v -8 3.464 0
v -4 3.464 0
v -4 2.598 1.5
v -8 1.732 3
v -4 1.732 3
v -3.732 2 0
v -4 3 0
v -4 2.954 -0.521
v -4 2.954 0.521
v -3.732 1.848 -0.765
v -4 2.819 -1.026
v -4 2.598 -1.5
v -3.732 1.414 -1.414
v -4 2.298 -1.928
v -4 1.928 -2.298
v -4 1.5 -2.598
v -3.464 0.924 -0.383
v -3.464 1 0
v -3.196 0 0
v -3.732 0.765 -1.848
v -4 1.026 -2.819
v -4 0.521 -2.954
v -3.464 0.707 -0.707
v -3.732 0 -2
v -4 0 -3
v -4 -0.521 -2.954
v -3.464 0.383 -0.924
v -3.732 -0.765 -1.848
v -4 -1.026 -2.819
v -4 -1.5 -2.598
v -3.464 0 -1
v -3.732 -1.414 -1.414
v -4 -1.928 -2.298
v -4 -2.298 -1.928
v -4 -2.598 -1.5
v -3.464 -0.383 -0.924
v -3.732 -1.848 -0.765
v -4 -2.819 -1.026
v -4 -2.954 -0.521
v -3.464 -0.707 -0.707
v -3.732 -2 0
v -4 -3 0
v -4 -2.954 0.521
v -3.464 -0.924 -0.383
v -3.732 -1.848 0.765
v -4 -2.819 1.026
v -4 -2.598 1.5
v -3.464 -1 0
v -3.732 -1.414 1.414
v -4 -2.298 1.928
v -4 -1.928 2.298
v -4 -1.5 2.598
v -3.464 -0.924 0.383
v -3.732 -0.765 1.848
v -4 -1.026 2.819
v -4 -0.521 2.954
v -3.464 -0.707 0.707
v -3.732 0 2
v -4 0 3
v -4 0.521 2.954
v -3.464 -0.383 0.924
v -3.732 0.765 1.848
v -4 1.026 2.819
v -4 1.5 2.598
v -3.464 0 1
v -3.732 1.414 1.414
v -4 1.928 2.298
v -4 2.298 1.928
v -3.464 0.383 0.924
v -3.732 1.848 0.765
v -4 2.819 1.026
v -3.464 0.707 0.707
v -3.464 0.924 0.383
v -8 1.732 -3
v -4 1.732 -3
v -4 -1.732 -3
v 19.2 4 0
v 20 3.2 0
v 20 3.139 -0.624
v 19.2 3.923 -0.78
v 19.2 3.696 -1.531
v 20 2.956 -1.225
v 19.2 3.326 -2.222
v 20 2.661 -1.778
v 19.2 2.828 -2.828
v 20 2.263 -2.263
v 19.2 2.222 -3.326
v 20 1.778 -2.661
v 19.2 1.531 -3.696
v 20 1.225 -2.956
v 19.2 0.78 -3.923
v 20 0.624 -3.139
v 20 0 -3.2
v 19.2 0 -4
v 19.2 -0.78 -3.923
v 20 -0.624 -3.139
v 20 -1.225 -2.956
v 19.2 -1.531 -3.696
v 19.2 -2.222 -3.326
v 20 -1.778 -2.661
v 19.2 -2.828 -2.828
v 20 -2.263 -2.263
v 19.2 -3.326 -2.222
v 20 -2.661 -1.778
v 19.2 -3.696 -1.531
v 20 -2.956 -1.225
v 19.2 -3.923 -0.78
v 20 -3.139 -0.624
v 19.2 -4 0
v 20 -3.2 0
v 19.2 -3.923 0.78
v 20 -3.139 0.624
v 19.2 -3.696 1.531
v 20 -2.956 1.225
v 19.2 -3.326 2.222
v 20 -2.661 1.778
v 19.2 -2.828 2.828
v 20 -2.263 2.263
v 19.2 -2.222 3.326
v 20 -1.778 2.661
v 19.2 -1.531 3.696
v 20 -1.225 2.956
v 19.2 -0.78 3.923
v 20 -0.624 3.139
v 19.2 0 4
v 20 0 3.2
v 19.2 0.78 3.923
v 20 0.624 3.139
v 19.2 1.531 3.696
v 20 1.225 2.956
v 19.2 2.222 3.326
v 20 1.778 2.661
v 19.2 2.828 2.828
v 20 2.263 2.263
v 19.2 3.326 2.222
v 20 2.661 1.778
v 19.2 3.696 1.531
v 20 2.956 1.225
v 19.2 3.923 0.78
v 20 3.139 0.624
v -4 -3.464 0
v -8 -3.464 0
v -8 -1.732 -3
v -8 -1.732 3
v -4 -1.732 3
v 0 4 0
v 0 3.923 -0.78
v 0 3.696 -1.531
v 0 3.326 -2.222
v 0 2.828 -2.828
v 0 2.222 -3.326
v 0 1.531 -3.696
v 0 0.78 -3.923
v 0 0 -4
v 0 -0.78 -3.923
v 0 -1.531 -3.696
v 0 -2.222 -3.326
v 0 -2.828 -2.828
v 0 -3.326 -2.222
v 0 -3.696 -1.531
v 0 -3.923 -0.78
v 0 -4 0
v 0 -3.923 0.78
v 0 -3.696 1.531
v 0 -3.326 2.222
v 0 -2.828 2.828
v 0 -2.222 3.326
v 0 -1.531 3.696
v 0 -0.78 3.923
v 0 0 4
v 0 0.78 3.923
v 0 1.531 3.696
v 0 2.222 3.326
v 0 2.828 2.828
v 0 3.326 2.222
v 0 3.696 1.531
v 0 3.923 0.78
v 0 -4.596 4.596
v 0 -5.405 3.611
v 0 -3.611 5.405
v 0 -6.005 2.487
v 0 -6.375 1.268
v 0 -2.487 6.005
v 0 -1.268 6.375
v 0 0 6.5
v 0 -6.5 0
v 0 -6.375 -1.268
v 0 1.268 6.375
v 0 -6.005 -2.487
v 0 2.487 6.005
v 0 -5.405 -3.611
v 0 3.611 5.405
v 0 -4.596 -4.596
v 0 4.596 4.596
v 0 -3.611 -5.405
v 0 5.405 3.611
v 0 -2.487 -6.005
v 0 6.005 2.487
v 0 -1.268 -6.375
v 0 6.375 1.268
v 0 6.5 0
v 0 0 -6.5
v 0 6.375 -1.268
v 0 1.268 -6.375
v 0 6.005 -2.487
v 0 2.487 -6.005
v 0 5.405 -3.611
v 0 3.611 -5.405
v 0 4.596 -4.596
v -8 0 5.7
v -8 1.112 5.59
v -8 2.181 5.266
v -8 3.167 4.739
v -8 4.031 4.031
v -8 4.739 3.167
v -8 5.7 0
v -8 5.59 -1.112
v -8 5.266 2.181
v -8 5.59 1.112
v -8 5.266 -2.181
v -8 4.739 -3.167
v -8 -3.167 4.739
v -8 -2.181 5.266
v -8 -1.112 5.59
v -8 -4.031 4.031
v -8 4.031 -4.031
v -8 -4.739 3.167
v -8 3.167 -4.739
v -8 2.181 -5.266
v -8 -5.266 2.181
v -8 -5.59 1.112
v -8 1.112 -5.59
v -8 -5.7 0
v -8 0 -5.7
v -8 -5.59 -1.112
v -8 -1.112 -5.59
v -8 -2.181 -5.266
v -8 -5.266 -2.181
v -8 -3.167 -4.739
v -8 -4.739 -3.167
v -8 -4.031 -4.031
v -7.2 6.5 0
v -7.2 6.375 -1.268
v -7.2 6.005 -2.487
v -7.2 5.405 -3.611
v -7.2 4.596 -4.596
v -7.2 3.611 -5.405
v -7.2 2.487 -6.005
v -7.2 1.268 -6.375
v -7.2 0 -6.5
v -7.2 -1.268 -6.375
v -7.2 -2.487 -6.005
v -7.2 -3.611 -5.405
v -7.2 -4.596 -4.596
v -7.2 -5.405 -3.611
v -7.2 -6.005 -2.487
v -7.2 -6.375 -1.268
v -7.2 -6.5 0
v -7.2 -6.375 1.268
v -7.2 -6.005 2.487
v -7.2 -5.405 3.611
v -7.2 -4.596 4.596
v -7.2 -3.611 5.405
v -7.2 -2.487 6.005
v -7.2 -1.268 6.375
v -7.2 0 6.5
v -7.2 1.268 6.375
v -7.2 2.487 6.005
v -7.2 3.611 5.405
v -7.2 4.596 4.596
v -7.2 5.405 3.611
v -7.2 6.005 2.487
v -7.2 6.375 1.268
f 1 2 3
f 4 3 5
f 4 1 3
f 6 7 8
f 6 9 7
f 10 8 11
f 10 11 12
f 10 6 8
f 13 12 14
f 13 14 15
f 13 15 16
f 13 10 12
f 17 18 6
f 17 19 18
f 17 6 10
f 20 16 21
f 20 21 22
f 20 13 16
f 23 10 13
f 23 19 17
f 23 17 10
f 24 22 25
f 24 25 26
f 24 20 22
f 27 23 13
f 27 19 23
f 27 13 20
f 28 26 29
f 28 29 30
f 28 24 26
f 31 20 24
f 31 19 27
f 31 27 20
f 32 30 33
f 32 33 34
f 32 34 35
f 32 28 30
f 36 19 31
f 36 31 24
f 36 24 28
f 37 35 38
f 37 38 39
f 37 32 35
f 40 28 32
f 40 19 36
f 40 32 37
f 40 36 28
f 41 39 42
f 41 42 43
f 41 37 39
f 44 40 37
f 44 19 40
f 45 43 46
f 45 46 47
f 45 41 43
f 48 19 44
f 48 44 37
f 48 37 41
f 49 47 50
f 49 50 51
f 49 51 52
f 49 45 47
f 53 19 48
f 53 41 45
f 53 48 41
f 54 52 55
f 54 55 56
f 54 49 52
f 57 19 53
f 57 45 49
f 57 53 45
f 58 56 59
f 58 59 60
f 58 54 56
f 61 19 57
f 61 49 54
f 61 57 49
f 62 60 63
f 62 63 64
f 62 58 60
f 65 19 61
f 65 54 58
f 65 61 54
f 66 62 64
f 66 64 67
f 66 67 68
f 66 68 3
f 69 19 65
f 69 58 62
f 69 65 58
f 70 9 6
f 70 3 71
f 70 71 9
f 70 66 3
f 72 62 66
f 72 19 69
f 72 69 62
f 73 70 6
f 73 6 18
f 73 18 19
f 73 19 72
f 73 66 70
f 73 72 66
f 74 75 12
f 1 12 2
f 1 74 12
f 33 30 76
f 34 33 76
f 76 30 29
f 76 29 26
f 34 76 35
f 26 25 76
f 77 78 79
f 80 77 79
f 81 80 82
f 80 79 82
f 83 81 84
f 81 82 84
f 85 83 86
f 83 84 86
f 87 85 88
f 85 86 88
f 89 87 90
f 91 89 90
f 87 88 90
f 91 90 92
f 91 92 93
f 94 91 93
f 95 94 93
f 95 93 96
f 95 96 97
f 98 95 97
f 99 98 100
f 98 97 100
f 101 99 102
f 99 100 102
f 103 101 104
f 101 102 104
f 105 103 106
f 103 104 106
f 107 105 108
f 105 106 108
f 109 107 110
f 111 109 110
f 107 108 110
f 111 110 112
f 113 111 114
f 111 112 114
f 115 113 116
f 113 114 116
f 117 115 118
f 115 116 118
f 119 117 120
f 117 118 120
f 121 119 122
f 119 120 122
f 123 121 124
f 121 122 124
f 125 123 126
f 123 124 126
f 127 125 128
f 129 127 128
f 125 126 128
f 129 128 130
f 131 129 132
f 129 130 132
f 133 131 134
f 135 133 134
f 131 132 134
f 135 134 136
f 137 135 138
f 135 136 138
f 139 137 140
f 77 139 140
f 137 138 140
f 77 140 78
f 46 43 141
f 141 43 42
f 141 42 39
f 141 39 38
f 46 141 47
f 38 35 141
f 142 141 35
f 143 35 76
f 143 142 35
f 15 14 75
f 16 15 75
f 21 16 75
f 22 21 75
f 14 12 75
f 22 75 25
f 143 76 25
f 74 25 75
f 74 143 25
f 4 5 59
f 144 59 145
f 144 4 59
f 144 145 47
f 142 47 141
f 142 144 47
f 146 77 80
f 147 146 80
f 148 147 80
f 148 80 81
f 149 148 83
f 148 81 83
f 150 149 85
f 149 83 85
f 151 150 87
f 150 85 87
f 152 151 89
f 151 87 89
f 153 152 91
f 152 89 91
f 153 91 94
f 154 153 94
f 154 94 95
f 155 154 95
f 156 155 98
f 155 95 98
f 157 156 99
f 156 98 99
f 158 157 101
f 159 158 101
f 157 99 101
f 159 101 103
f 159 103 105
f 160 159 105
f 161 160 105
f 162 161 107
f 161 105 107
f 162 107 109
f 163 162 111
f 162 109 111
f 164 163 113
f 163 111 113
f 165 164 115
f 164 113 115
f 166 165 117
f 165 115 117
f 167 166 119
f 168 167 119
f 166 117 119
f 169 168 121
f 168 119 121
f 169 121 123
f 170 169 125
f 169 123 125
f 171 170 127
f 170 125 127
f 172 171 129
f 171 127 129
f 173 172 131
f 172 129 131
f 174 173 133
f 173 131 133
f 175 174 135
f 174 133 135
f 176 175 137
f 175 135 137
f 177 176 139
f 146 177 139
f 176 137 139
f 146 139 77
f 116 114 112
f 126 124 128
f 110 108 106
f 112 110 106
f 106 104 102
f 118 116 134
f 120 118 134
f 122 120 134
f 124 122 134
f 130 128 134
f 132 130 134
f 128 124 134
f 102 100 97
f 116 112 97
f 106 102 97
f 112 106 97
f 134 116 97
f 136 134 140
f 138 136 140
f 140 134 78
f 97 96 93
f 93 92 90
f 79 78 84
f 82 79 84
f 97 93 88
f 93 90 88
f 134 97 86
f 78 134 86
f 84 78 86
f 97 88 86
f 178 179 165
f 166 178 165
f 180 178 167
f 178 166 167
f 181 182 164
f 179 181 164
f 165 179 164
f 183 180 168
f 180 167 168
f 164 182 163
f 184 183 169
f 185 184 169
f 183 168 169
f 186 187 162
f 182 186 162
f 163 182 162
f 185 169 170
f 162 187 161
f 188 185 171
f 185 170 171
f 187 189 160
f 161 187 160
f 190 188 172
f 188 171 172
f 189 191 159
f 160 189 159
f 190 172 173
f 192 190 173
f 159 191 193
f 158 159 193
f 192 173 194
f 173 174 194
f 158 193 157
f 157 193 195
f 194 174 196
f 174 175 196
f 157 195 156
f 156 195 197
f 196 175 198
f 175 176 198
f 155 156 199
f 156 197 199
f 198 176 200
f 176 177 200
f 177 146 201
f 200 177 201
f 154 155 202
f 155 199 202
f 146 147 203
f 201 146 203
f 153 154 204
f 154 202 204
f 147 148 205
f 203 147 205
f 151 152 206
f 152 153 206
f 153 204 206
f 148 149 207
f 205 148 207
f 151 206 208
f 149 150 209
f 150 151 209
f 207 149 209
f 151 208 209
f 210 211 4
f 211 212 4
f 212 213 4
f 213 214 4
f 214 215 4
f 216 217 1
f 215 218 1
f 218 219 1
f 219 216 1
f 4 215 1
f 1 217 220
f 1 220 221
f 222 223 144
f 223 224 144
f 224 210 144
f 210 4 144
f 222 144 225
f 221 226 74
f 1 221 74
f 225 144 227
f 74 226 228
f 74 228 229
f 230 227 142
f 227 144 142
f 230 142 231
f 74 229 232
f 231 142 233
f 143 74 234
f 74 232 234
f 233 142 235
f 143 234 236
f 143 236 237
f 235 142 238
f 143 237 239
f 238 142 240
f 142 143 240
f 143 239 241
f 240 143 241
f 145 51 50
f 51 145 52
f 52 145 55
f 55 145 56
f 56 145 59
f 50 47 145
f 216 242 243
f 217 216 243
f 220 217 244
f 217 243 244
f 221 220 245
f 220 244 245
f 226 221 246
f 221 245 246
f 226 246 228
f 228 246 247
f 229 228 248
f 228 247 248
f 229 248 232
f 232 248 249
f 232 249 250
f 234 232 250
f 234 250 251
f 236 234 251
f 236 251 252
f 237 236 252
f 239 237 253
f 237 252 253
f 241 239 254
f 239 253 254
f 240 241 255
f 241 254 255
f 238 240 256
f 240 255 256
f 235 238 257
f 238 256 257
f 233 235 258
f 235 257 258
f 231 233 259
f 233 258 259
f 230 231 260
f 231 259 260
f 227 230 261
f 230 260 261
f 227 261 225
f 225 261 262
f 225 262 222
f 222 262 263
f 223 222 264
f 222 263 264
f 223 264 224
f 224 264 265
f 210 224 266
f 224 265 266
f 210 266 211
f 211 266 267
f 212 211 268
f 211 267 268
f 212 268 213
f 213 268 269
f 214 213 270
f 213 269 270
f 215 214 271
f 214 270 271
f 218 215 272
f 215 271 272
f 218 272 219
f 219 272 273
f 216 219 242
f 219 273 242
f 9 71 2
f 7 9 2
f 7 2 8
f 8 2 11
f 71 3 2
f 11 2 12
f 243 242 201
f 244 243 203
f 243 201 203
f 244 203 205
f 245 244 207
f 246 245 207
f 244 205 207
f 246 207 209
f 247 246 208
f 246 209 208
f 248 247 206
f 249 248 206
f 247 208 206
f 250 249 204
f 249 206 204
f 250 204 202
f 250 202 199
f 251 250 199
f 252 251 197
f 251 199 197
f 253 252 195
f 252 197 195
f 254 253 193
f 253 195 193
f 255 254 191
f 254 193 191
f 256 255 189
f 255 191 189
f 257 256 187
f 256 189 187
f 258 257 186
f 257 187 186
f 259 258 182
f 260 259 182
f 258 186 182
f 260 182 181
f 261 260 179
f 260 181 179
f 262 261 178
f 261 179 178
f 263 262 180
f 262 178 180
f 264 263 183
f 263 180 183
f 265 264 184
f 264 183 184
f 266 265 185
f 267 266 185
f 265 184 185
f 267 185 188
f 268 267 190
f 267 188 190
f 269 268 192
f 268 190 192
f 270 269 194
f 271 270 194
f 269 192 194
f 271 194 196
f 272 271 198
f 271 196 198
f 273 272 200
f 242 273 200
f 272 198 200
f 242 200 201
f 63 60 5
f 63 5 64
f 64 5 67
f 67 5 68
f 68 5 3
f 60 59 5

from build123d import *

# Parameters (mm, degrees)
CHAMFER1_SIZE      = 0.8
CUT_EXTRUDE1_DEPTH = 4


with BuildPart() as part:
    # Sketch1 → Revolve1 (revolve)
    with BuildSketch(Plane.XY):
        Polygon((-8, 0), (-8, 6.5), (0, 6.5), (0, 4), (20, 4), (20, 0), align=None)
    revolve(axis=Axis((20, 0, 0), (-1, 0, 0)))

    # Chamfer1
    chamfer1_edges = [part.edges().sort_by_distance(p)[0] for p in [
        (20, -4, 0),
        (-8, -6.5, 0),
    ]]
    chamfer(chamfer1_edges, length=CHAMFER1_SIZE)

    # Sketch2 → Cut-Revolve1 (revolve, cut)
    with BuildSketch(Plane.XY):
        Polygon((-8, 0), (-8, 3), (-4, 3), (-3.196152423, 0), align=None)
    revolve(axis=Axis((-3.196152423, 0, 0), (-1, 0, 0)), mode=Mode.SUBTRACT)

    # Sketch3 → Cut-Extrude1 (cut)
    with BuildSketch(Plane(origin=(-8, 0, 0), x_dir=(0, 0, -1), z_dir=(1, 0, 0))):
        Polygon((-3, 1.732050808), (-3, -1.732050808), (0, -3.464101615), (3, -1.732050808), (3, 1.732050808), (0, 3.464101615), align=None)
    extrude(amount=CUT_EXTRUDE1_DEPTH, mode=Mode.SUBTRACT)


solid = part.part
